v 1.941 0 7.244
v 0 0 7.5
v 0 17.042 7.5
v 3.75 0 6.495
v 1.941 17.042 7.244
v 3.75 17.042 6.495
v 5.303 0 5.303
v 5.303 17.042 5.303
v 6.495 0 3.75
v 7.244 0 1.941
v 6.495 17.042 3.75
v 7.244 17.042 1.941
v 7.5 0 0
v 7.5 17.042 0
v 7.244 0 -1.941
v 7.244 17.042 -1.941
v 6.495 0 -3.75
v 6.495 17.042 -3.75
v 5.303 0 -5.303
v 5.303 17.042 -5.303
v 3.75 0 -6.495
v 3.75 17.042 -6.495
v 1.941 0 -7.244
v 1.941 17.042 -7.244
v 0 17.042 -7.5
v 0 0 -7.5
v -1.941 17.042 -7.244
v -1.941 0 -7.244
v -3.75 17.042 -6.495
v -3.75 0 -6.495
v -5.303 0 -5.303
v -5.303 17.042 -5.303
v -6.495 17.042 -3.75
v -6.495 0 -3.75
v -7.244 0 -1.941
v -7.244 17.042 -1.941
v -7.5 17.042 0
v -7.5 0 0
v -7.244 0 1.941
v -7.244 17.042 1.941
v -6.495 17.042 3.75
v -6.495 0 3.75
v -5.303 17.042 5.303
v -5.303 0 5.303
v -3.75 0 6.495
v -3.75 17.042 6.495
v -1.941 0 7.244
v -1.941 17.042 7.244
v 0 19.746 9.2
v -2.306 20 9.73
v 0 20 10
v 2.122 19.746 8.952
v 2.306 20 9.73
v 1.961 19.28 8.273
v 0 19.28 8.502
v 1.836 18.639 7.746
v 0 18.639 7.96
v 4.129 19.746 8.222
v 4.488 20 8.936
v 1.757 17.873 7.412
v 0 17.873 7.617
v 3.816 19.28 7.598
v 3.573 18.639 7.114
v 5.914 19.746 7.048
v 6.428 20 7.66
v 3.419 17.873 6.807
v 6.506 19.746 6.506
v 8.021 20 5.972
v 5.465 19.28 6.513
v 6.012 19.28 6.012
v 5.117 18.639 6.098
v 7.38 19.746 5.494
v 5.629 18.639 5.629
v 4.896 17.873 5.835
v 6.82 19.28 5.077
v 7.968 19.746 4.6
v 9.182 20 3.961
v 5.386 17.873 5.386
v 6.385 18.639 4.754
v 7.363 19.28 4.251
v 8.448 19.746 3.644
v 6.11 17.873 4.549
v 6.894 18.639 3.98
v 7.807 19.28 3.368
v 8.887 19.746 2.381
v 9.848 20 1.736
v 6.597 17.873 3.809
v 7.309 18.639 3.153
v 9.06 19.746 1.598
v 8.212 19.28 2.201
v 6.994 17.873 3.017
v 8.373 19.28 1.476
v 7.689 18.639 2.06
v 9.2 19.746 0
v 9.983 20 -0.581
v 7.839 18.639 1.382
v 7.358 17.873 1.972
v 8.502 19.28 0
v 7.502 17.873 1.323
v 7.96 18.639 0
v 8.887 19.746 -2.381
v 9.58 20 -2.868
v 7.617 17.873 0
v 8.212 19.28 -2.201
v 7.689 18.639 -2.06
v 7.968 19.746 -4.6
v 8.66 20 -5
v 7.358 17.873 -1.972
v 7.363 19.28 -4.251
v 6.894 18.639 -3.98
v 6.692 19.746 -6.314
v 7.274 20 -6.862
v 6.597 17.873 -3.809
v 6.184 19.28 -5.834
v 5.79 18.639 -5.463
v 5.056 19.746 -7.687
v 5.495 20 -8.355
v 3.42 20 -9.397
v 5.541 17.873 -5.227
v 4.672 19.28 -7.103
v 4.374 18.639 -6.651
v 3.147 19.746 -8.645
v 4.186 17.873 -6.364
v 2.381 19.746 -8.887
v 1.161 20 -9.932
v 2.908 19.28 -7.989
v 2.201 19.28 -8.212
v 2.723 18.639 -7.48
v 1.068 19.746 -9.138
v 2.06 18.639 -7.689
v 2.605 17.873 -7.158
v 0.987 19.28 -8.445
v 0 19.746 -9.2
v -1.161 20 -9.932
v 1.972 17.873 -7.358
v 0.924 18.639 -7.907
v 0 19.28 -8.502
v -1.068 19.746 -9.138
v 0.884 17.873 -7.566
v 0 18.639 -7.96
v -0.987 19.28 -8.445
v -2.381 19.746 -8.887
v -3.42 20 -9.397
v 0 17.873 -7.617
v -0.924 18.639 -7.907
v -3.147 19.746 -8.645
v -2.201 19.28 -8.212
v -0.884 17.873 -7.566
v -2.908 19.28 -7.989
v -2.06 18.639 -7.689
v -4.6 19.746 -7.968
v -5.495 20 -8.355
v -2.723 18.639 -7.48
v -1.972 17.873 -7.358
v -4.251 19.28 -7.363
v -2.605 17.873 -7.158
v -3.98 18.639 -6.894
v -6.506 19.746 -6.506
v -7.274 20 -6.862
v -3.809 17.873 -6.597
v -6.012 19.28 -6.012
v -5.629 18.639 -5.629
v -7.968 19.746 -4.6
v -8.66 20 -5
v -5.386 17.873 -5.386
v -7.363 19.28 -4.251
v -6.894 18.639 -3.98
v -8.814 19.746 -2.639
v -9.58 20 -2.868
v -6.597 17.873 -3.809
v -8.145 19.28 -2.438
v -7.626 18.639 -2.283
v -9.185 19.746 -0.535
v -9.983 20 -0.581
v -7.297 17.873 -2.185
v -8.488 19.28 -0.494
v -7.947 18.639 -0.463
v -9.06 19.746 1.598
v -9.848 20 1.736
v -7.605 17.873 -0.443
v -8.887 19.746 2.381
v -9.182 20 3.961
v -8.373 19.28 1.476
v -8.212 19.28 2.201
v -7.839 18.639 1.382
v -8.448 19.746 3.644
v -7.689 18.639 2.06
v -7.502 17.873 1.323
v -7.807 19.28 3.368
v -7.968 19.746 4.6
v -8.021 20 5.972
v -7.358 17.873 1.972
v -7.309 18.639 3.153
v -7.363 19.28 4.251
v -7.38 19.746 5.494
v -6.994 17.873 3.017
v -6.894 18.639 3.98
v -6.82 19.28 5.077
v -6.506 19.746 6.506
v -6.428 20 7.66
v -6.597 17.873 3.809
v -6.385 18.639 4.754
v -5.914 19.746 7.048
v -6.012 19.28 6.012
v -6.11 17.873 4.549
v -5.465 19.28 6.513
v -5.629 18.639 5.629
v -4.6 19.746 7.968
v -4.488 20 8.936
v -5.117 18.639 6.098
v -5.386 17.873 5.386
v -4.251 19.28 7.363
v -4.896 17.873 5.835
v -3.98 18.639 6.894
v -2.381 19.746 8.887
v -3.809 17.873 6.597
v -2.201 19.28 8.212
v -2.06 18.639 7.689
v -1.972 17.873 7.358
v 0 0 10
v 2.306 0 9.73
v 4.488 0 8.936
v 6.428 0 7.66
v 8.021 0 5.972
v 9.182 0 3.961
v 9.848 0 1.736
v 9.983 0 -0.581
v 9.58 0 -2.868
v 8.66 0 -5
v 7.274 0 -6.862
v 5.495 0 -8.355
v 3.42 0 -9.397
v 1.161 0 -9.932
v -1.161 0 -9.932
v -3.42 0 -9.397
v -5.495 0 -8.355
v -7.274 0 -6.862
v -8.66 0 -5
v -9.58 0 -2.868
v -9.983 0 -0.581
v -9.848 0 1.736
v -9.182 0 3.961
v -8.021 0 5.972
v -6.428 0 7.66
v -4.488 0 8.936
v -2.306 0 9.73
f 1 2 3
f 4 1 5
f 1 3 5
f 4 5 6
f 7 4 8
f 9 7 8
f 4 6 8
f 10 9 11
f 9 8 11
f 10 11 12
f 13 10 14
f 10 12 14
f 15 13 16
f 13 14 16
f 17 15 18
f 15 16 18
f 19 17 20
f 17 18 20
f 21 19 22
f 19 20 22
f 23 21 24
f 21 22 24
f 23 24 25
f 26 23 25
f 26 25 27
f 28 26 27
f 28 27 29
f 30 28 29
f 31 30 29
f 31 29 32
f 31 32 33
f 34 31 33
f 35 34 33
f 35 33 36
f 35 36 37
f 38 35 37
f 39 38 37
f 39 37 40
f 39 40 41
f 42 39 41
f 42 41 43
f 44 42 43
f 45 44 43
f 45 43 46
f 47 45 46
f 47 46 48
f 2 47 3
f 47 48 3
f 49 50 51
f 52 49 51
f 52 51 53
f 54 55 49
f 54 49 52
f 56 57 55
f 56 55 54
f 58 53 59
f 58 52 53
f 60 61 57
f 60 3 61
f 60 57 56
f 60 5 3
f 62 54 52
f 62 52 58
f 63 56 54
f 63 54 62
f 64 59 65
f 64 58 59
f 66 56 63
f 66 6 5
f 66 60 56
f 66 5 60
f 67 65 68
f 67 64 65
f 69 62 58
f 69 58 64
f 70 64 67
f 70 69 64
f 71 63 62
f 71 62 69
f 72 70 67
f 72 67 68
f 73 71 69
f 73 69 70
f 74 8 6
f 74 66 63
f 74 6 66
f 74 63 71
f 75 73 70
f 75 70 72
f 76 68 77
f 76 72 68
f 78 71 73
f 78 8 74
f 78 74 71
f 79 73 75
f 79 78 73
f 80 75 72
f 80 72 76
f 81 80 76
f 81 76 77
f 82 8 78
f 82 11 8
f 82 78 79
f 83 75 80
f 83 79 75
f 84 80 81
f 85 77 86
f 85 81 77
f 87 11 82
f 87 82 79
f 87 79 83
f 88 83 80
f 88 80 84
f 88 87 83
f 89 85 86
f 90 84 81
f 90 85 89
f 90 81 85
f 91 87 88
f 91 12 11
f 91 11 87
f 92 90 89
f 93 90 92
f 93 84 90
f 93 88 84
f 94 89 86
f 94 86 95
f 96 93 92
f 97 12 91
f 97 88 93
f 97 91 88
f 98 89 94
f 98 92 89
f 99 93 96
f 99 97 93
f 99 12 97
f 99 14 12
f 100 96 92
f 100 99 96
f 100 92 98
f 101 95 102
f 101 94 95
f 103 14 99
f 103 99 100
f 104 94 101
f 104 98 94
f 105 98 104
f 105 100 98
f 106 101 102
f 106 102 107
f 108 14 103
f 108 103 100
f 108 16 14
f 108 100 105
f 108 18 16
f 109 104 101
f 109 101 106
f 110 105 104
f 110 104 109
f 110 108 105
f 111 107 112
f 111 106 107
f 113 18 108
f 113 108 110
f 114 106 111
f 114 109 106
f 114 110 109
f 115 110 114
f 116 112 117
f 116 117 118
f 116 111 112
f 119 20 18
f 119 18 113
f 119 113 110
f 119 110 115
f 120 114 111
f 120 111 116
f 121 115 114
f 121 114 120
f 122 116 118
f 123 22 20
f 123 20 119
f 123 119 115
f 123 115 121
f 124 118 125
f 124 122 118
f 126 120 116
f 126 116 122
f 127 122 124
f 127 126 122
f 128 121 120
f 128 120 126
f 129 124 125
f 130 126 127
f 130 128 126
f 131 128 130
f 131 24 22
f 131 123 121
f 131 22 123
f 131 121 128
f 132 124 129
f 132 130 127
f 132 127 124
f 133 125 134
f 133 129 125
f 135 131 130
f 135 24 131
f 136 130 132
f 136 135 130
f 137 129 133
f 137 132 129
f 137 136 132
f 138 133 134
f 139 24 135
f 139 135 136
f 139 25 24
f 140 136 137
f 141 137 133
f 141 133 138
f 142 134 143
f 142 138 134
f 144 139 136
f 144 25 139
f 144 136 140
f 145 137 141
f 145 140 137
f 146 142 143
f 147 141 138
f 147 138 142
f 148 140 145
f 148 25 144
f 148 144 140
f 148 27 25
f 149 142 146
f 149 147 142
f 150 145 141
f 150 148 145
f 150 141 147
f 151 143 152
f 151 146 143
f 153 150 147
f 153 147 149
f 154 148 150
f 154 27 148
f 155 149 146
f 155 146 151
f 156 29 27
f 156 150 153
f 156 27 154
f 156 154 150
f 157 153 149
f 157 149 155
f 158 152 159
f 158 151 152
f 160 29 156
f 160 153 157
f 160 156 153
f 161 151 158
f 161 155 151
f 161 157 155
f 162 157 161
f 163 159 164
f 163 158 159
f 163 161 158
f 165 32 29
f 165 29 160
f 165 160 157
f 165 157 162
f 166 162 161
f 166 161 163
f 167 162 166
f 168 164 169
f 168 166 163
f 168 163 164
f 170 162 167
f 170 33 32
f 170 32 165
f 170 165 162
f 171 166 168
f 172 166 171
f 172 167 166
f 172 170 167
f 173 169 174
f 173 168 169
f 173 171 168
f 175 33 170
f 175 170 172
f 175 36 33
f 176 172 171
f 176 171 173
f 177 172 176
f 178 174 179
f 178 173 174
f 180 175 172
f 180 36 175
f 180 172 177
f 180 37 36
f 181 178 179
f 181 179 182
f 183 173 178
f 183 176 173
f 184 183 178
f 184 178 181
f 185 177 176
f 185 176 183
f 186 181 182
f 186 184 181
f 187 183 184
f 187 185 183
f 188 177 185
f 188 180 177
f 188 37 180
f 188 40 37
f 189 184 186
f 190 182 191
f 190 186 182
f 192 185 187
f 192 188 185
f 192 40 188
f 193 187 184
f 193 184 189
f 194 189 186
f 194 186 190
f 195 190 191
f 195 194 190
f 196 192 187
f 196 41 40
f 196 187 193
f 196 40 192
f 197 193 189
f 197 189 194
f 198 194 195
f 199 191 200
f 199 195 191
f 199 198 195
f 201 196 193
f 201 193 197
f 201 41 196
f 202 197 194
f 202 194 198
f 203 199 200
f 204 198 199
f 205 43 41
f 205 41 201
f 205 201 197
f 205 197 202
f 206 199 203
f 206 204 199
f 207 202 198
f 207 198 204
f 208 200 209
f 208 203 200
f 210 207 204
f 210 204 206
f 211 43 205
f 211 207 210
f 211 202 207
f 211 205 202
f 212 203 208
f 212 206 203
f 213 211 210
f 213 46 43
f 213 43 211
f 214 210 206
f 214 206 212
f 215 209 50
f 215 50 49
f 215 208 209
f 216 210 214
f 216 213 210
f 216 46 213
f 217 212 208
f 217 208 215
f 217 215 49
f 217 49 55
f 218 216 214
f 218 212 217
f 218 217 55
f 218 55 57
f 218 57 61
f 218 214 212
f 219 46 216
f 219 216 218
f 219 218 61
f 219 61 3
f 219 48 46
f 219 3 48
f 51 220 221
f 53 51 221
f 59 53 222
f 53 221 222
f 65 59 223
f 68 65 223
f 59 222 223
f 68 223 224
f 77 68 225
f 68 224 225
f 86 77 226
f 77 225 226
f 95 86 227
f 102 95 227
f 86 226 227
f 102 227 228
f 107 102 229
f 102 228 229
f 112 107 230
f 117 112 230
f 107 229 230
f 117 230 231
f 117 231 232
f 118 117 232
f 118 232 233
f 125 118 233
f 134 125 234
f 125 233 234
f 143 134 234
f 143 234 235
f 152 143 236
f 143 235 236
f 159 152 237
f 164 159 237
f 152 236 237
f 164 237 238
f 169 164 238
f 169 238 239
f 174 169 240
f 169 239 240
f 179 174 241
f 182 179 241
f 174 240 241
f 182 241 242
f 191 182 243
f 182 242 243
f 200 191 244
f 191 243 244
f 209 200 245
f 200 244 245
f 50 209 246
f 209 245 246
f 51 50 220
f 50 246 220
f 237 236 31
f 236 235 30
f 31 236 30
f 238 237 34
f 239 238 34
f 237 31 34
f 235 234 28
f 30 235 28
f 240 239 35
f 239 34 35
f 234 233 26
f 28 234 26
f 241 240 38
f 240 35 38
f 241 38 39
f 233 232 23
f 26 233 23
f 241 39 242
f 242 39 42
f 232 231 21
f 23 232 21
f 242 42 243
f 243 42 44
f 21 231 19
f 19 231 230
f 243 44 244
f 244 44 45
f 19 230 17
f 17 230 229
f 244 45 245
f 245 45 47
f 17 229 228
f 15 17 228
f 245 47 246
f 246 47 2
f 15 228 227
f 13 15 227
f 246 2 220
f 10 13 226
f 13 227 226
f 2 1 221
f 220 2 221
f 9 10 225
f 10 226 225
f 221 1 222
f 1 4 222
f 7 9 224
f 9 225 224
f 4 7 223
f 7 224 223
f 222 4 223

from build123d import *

# Parameters (mm, degrees)
SKETCH1_R           = 10
BOSS_EXTRUDE1_DEPTH = 20
CUT_EXTRUDE1_REACH  = 26.495
SKETCH2_R           = 7.5
FILLET1_R           = 3


with BuildPart() as part:
    # Sketch1 → Boss-Extrude1 (new body)
    with BuildSketch(Plane(origin=(0, 0, 0), x_dir=(1, 0, 0), z_dir=(0, 1, 0))):
        with Locations(Location((0, 0, 0), (0, 0, 270))):
            Circle(SKETCH1_R)
    extrude(amount=BOSS_EXTRUDE1_DEPTH)

    # Sketch2 → Cut-Extrude1 (cut, up to next)
    with BuildSketch(Plane(origin=(0, 20, 0), x_dir=(1, 0, 0), z_dir=(0, 1, 0)), mode=Mode.PRIVATE) as cut_extrude1_sk1:
        with Locations(Location((0, 0, 0), (0, 0, 270))):
            Circle(SKETCH2_R)
    cut_extrude1_tool1 = extrude(cut_extrude1_sk1.sketch, amount=-CUT_EXTRUDE1_REACH, mode=Mode.PRIVATE) & part.part
    add(cut_extrude1_tool1.solids().sort_by_distance((0, 20, 0))[0], mode=Mode.SUBTRACT)

    # Fillet1
    # the kernel refuses this fillet: 3 mm, written as the material it takes off along each edge
    with BuildSketch(Plane(origin=(0, 20, 0), x_dir=(-1.8e-16, 0, 1), z_dir=(-1, 0, -1.8e-16))) as fillet1_piece_1:
        with BuildLine():
            CenterArc((10.5, -2.958039891550115), FILLET1_R, 99.5940682268595, 80.4059317731405)
            Line((7.5, -2.958039891550115), (7.44, -2.958039891550115))
            Line((7.44, -2.958039891550115), (7.44, 0))
            Line((7.44, 0), (7.5, 0.05999999999999872))
            ThreePointArc((7.5, 0.05999999999999872), (8.750000000000025, 0.05999999999999872), (9.99000000000005, 0.05916079783069961))
            Line((9.99000000000005, 0.05916079783069961), (10.00000000000005, -2.9843e-13))
        make_face()
    revolve(axis=Axis((0, 20, 0), (0, 1, 0)), mode=Mode.SUBTRACT)


solid = part.part
